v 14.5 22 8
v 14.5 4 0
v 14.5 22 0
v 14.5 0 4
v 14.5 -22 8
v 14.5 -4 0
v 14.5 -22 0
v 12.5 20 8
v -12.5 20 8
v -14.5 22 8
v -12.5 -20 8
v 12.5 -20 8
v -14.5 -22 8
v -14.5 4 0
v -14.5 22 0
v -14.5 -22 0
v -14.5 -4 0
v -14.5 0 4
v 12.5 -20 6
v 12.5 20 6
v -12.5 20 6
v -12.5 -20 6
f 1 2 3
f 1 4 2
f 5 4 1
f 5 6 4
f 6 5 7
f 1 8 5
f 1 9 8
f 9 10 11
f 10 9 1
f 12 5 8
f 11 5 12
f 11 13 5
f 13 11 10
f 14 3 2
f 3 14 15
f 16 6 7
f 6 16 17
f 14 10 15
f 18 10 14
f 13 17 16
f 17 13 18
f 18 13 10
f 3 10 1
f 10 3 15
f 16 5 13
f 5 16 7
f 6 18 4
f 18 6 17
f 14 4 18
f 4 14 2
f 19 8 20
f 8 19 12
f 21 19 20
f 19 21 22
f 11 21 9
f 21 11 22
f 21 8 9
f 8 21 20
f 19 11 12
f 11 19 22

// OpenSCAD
// [FL_INDEX: keywords="openscad, 3d_parametric, Bar_Clamp_Rod_Adapter, csg_solid" | COT="Parametric OpenSCAD design from 3DCodeverse"]
// Title: Bar Clamp Rod Adapter

/*
 * Bar Clamp Rod Adapter (Parametric), v0.42
 *
 * by Alex Franke (CodeCreations), Jan 2013
 * http://www.theFrankes.com
 * 
 * Licenced under Creative Commons Attribution - Non-Commercial - Share Alike 3.0 
 * 
 * DESCRIPTION: This adapter makes it eacy to clamp rods down to a flat surface with 
 *   a bar clamp.  
 * 
 * INSTRUCTIONS: Choose some values in the "User-defined values" section if 
 *   necessary, render, and print. Print with several walls and higher infill for 
 *   added strength.  
 * 
 * v0.42, Jan 23, 2013: Initial Release.
 * 
 * TODO: 
 *   * None at this time
 */

/////////////////////////////////////////////////////////////////////////////
// User-defined values... 
/////////////////////////////////////////////////////////////////////////////

// The length of the clamp jaw
jawLength = 40; 

// The width of the clamp jaw 
jawWidth = 25; 

// The thickness of the lip surrounding the clamp jaw
lipThickness = 2; 

// The height of the lip surrounding the clamp jaw
lipHeight = 2; 

// The depth of the groove 
grooveDepth = 4; 

// The minimum thickness of the adapter (at the top of the groove) 
minimumThickness = 2;


/////////////////////////////////////////////////////////////////////////////
// The code... 
/////////////////////////////////////////////////////////////////////////////
totalSize = [jawWidth+lipThickness*2,jawLength+lipThickness*2,grooveDepth+minimumThickness+lipHeight];

difference() {
	translate([0,0,totalSize[2]/2]) 
		cube(totalSize, center=true);

	translate([-(totalSize[0]+1)/2,0,grooveDepth]) 
		rotate([-135,0,0]) 
			cube([totalSize[0]+1,grooveDepth*2,grooveDepth*2]);

	translate([0,0,(lipHeight+1)/2+grooveDepth+minimumThickness]) 
		cube([jawWidth,jawLength,lipHeight+1], center=true);

}
	
